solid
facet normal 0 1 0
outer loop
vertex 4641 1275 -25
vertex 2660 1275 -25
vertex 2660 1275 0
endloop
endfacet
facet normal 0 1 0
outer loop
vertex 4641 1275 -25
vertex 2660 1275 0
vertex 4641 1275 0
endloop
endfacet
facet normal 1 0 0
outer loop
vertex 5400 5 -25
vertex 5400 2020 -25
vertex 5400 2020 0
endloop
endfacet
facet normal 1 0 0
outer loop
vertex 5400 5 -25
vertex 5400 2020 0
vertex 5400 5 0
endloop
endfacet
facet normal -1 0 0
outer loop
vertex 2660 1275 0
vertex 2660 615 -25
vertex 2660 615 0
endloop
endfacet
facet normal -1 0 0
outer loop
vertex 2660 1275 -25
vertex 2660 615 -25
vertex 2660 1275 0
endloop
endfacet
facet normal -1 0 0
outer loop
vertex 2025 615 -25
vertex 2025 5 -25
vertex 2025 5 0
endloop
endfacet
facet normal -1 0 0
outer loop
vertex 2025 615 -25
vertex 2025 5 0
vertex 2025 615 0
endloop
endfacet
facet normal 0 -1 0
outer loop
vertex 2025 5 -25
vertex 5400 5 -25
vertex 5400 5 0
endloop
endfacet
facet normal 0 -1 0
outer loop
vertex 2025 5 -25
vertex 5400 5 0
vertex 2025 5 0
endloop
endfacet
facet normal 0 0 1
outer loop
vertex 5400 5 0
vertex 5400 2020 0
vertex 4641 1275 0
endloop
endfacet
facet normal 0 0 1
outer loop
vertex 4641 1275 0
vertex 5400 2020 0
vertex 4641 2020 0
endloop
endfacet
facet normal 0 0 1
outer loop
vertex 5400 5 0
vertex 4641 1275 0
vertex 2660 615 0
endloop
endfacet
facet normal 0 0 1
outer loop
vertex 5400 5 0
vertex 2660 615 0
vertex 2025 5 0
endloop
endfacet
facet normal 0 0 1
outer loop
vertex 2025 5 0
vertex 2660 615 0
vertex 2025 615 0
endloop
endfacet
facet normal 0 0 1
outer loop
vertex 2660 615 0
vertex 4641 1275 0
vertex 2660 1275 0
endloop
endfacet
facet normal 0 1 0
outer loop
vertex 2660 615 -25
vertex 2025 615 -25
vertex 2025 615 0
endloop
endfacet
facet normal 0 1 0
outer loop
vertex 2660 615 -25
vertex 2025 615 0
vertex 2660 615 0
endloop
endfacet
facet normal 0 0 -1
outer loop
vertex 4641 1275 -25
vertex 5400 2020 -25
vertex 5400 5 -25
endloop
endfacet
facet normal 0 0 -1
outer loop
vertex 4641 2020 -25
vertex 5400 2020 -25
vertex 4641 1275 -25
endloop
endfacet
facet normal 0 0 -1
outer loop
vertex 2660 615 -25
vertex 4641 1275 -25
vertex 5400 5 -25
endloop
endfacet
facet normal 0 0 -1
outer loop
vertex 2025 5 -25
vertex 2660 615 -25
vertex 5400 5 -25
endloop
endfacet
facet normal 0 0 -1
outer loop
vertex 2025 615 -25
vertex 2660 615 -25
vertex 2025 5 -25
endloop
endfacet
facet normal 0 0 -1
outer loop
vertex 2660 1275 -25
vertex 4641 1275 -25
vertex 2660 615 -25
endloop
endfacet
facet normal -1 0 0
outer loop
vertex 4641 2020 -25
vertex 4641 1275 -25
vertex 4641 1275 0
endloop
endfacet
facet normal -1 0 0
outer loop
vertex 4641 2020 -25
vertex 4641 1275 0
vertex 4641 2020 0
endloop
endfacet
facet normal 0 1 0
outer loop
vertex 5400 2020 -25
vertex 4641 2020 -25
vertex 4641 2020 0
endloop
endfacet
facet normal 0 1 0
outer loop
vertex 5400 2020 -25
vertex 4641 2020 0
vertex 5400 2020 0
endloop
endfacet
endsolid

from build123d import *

# Parameters (mm, degrees)
TABAN_FLAN_1_DEPTH         = 25
KES_EKSTR_ZYON1_DEPTH      = 6508.676543898
KES_EKSTR_ZYON1_DEPTH_BACK = 6508.676543898
IZIM7_W                    = 1400
IZIM7_H                    = 1895
IZIM7_W_2                  = 310
IZIM7_H_2                  = 495
KES_EKSTR_ZYON2_DEPTH      = 6508.676543898
KES_EKSTR_ZYON2_DEPTH_BACK = 6508.676543898
IZIM8_W                    = 292
IZIM8_H                    = 2515
KES_EKSTR_ZYON3_DEPTH      = 6240.38698912
KES_EKSTR_ZYON3_DEPTH_BACK = 6240.38698912
IZIM10_W                   = 2900
IZIM10_H                   = 350
KES_EKSTR_ZYON4_DEPTH      = 6240.38698912
KES_EKSTR_ZYON4_DEPTH_BACK = 6240.38698912
KES_EKSTR_ZYON5_DEPTH      = 6191.05856192
KES_EKSTR_ZYON5_DEPTH_BACK = 6191.05856192
IZIM12_W                   = 5
IZIM12_H                   = 615
KES_EKSTR_ZYON6_DEPTH      = 6191.05856192
KES_EKSTR_ZYON6_DEPTH_BACK = 6191.05856192
IZIM13_W                   = 55
IZIM13_H                   = 2385
KES_EKSTR_ZYON7_DEPTH      = 6140.360715905
KES_EKSTR_ZYON7_DEPTH_BACK = 6140.360715905
KES_EKSTR_ZYON8_DEPTH      = 6140.360715905
KES_EKSTR_ZYON8_DEPTH_BACK = 6140.360715905
IZIM16_W                   = 190
IZIM16_H                   = 370
IZIM16_W_2                 = 620
IZIM16_H_2                 = 610


# Sheet-metal steps are written as plain solids
with BuildPart() as part:
    # Çizim1 → Taban-Flanş1 (new body)
    with BuildSketch(Plane.XY):
        Polygon((0, 0), (0, 1895), (2935, 1895), (2935, 2020), (4900, 2020), (4900, 2515), (6002, 2515), (6002, 0), align=None)
    extrude(amount=-TABAN_FLAN_1_DEPTH)

    # Çizim7 → Kes-Ekstrüzyon1 (cut, two sides: drawn at the far end of the back side and taken through both)
    with BuildSketch(Plane.XY.offset(-KES_EKSTR_ZYON1_DEPTH_BACK)):
        with Locations((700, 947.5)):
            Rectangle(IZIM7_W, IZIM7_H)
        with Locations((5055, 2267.5)):
            Rectangle(IZIM7_W_2, IZIM7_H_2)
    extrude(amount=KES_EKSTR_ZYON1_DEPTH + KES_EKSTR_ZYON1_DEPTH_BACK, mode=Mode.SUBTRACT)

    # Çizim8 → Kes-Ekstrüzyon2 (cut, two sides: drawn at the far end of the back side and taken through both)
    with BuildSketch(Plane.XY.offset(-KES_EKSTR_ZYON2_DEPTH_BACK)):
        with Locations((5856, 1257.5)):
            Rectangle(IZIM8_W, IZIM8_H)
    extrude(amount=KES_EKSTR_ZYON2_DEPTH + KES_EKSTR_ZYON2_DEPTH_BACK, mode=Mode.SUBTRACT)

    # Çizim10 → Kes-Ekstrüzyon3 (cut, two sides: drawn at the far end of the back side and taken through both)
    with BuildSketch(Plane.XY.offset(-KES_EKSTR_ZYON3_DEPTH_BACK)):
        with Locations((2850, 1845)):
            Rectangle(IZIM10_W, IZIM10_H)
    extrude(amount=KES_EKSTR_ZYON3_DEPTH + KES_EKSTR_ZYON3_DEPTH_BACK, mode=Mode.SUBTRACT)

    # Çizim11 → Kes-Ekstrüzyon4 (cut, two sides: drawn at the far end of the back side and taken through both)
    with BuildSketch(Plane.XY.offset(-KES_EKSTR_ZYON4_DEPTH_BACK)):
        Polygon((4300, 1670), (4530, 1670), (4530, 2020), (5210, 2020), (5210, 2390), (5710, 2390), (5778.630385148, 2406.496682207), (5749.815338653, 2697.266696836), (5189.231706845, 2697.266696836), (4530, 2199.552257381), (4300, 2199.552257381), align=None)
    extrude(amount=KES_EKSTR_ZYON4_DEPTH + KES_EKSTR_ZYON4_DEPTH_BACK, mode=Mode.SUBTRACT)

    # Çizim12 → Kes-Ekstrüzyon5 (cut, two sides: drawn at the far end of the back side and taken through both)
    with BuildSketch(Plane.XY.offset(-KES_EKSTR_ZYON5_DEPTH_BACK)):
        Polygon((2660, 1670), (1400, 1670), (1400, 615), (1405, 615), (2660, 615), align=None)
        with Locations((1402.5, 307.5)):
            Rectangle(IZIM12_W, IZIM12_H)
    extrude(amount=KES_EKSTR_ZYON5_DEPTH + KES_EKSTR_ZYON5_DEPTH_BACK, mode=Mode.SUBTRACT)

    # Çizim13 → Kes-Ekstrüzyon6 (cut, two sides: drawn at the far end of the back side and taken through both)
    with BuildSketch(Plane.XY.offset(-KES_EKSTR_ZYON6_DEPTH_BACK)):
        with Locations((5682.5, 1197.5)):
            Rectangle(IZIM13_W, IZIM13_H)
        Polygon((1405, 0), (5710, 0), (5710, 5), (5655, 5), (1405, 5), align=None)
    extrude(amount=KES_EKSTR_ZYON6_DEPTH + KES_EKSTR_ZYON6_DEPTH_BACK, mode=Mode.SUBTRACT)

    # Çizim15 → Kes-Ekstrüzyon7 (cut, two sides: drawn at the far end of the back side and taken through both)
    with BuildSketch(Plane.XY.offset(-KES_EKSTR_ZYON7_DEPTH_BACK)):
        Polygon((2660, 1275), (4641, 1275), (4641, 2020), (5020.0077847, 2245.071458559), (4183.340521497, 2599.685397929), (2166.473741327, 1968.029318425), align=None)
    extrude(amount=KES_EKSTR_ZYON7_DEPTH + KES_EKSTR_ZYON7_DEPTH_BACK, mode=Mode.SUBTRACT)

    # Çizim16 → Kes-Ekstrüzyon8 (cut, two sides: drawn at the far end of the back side and taken through both)
    with BuildSketch(Plane.XY.offset(-KES_EKSTR_ZYON8_DEPTH_BACK)):
        Polygon((5655, 5), (5655, 2390), (5400, 2390), (5400, 2020), (5400, 5), align=None)
        with Locations((5305, 2205)):
            Rectangle(IZIM16_W, IZIM16_H)
        with Locations((1715, 310)):
            Rectangle(IZIM16_W_2, IZIM16_H_2)
    extrude(amount=KES_EKSTR_ZYON8_DEPTH + KES_EKSTR_ZYON8_DEPTH_BACK, mode=Mode.SUBTRACT)


solid = part.part
